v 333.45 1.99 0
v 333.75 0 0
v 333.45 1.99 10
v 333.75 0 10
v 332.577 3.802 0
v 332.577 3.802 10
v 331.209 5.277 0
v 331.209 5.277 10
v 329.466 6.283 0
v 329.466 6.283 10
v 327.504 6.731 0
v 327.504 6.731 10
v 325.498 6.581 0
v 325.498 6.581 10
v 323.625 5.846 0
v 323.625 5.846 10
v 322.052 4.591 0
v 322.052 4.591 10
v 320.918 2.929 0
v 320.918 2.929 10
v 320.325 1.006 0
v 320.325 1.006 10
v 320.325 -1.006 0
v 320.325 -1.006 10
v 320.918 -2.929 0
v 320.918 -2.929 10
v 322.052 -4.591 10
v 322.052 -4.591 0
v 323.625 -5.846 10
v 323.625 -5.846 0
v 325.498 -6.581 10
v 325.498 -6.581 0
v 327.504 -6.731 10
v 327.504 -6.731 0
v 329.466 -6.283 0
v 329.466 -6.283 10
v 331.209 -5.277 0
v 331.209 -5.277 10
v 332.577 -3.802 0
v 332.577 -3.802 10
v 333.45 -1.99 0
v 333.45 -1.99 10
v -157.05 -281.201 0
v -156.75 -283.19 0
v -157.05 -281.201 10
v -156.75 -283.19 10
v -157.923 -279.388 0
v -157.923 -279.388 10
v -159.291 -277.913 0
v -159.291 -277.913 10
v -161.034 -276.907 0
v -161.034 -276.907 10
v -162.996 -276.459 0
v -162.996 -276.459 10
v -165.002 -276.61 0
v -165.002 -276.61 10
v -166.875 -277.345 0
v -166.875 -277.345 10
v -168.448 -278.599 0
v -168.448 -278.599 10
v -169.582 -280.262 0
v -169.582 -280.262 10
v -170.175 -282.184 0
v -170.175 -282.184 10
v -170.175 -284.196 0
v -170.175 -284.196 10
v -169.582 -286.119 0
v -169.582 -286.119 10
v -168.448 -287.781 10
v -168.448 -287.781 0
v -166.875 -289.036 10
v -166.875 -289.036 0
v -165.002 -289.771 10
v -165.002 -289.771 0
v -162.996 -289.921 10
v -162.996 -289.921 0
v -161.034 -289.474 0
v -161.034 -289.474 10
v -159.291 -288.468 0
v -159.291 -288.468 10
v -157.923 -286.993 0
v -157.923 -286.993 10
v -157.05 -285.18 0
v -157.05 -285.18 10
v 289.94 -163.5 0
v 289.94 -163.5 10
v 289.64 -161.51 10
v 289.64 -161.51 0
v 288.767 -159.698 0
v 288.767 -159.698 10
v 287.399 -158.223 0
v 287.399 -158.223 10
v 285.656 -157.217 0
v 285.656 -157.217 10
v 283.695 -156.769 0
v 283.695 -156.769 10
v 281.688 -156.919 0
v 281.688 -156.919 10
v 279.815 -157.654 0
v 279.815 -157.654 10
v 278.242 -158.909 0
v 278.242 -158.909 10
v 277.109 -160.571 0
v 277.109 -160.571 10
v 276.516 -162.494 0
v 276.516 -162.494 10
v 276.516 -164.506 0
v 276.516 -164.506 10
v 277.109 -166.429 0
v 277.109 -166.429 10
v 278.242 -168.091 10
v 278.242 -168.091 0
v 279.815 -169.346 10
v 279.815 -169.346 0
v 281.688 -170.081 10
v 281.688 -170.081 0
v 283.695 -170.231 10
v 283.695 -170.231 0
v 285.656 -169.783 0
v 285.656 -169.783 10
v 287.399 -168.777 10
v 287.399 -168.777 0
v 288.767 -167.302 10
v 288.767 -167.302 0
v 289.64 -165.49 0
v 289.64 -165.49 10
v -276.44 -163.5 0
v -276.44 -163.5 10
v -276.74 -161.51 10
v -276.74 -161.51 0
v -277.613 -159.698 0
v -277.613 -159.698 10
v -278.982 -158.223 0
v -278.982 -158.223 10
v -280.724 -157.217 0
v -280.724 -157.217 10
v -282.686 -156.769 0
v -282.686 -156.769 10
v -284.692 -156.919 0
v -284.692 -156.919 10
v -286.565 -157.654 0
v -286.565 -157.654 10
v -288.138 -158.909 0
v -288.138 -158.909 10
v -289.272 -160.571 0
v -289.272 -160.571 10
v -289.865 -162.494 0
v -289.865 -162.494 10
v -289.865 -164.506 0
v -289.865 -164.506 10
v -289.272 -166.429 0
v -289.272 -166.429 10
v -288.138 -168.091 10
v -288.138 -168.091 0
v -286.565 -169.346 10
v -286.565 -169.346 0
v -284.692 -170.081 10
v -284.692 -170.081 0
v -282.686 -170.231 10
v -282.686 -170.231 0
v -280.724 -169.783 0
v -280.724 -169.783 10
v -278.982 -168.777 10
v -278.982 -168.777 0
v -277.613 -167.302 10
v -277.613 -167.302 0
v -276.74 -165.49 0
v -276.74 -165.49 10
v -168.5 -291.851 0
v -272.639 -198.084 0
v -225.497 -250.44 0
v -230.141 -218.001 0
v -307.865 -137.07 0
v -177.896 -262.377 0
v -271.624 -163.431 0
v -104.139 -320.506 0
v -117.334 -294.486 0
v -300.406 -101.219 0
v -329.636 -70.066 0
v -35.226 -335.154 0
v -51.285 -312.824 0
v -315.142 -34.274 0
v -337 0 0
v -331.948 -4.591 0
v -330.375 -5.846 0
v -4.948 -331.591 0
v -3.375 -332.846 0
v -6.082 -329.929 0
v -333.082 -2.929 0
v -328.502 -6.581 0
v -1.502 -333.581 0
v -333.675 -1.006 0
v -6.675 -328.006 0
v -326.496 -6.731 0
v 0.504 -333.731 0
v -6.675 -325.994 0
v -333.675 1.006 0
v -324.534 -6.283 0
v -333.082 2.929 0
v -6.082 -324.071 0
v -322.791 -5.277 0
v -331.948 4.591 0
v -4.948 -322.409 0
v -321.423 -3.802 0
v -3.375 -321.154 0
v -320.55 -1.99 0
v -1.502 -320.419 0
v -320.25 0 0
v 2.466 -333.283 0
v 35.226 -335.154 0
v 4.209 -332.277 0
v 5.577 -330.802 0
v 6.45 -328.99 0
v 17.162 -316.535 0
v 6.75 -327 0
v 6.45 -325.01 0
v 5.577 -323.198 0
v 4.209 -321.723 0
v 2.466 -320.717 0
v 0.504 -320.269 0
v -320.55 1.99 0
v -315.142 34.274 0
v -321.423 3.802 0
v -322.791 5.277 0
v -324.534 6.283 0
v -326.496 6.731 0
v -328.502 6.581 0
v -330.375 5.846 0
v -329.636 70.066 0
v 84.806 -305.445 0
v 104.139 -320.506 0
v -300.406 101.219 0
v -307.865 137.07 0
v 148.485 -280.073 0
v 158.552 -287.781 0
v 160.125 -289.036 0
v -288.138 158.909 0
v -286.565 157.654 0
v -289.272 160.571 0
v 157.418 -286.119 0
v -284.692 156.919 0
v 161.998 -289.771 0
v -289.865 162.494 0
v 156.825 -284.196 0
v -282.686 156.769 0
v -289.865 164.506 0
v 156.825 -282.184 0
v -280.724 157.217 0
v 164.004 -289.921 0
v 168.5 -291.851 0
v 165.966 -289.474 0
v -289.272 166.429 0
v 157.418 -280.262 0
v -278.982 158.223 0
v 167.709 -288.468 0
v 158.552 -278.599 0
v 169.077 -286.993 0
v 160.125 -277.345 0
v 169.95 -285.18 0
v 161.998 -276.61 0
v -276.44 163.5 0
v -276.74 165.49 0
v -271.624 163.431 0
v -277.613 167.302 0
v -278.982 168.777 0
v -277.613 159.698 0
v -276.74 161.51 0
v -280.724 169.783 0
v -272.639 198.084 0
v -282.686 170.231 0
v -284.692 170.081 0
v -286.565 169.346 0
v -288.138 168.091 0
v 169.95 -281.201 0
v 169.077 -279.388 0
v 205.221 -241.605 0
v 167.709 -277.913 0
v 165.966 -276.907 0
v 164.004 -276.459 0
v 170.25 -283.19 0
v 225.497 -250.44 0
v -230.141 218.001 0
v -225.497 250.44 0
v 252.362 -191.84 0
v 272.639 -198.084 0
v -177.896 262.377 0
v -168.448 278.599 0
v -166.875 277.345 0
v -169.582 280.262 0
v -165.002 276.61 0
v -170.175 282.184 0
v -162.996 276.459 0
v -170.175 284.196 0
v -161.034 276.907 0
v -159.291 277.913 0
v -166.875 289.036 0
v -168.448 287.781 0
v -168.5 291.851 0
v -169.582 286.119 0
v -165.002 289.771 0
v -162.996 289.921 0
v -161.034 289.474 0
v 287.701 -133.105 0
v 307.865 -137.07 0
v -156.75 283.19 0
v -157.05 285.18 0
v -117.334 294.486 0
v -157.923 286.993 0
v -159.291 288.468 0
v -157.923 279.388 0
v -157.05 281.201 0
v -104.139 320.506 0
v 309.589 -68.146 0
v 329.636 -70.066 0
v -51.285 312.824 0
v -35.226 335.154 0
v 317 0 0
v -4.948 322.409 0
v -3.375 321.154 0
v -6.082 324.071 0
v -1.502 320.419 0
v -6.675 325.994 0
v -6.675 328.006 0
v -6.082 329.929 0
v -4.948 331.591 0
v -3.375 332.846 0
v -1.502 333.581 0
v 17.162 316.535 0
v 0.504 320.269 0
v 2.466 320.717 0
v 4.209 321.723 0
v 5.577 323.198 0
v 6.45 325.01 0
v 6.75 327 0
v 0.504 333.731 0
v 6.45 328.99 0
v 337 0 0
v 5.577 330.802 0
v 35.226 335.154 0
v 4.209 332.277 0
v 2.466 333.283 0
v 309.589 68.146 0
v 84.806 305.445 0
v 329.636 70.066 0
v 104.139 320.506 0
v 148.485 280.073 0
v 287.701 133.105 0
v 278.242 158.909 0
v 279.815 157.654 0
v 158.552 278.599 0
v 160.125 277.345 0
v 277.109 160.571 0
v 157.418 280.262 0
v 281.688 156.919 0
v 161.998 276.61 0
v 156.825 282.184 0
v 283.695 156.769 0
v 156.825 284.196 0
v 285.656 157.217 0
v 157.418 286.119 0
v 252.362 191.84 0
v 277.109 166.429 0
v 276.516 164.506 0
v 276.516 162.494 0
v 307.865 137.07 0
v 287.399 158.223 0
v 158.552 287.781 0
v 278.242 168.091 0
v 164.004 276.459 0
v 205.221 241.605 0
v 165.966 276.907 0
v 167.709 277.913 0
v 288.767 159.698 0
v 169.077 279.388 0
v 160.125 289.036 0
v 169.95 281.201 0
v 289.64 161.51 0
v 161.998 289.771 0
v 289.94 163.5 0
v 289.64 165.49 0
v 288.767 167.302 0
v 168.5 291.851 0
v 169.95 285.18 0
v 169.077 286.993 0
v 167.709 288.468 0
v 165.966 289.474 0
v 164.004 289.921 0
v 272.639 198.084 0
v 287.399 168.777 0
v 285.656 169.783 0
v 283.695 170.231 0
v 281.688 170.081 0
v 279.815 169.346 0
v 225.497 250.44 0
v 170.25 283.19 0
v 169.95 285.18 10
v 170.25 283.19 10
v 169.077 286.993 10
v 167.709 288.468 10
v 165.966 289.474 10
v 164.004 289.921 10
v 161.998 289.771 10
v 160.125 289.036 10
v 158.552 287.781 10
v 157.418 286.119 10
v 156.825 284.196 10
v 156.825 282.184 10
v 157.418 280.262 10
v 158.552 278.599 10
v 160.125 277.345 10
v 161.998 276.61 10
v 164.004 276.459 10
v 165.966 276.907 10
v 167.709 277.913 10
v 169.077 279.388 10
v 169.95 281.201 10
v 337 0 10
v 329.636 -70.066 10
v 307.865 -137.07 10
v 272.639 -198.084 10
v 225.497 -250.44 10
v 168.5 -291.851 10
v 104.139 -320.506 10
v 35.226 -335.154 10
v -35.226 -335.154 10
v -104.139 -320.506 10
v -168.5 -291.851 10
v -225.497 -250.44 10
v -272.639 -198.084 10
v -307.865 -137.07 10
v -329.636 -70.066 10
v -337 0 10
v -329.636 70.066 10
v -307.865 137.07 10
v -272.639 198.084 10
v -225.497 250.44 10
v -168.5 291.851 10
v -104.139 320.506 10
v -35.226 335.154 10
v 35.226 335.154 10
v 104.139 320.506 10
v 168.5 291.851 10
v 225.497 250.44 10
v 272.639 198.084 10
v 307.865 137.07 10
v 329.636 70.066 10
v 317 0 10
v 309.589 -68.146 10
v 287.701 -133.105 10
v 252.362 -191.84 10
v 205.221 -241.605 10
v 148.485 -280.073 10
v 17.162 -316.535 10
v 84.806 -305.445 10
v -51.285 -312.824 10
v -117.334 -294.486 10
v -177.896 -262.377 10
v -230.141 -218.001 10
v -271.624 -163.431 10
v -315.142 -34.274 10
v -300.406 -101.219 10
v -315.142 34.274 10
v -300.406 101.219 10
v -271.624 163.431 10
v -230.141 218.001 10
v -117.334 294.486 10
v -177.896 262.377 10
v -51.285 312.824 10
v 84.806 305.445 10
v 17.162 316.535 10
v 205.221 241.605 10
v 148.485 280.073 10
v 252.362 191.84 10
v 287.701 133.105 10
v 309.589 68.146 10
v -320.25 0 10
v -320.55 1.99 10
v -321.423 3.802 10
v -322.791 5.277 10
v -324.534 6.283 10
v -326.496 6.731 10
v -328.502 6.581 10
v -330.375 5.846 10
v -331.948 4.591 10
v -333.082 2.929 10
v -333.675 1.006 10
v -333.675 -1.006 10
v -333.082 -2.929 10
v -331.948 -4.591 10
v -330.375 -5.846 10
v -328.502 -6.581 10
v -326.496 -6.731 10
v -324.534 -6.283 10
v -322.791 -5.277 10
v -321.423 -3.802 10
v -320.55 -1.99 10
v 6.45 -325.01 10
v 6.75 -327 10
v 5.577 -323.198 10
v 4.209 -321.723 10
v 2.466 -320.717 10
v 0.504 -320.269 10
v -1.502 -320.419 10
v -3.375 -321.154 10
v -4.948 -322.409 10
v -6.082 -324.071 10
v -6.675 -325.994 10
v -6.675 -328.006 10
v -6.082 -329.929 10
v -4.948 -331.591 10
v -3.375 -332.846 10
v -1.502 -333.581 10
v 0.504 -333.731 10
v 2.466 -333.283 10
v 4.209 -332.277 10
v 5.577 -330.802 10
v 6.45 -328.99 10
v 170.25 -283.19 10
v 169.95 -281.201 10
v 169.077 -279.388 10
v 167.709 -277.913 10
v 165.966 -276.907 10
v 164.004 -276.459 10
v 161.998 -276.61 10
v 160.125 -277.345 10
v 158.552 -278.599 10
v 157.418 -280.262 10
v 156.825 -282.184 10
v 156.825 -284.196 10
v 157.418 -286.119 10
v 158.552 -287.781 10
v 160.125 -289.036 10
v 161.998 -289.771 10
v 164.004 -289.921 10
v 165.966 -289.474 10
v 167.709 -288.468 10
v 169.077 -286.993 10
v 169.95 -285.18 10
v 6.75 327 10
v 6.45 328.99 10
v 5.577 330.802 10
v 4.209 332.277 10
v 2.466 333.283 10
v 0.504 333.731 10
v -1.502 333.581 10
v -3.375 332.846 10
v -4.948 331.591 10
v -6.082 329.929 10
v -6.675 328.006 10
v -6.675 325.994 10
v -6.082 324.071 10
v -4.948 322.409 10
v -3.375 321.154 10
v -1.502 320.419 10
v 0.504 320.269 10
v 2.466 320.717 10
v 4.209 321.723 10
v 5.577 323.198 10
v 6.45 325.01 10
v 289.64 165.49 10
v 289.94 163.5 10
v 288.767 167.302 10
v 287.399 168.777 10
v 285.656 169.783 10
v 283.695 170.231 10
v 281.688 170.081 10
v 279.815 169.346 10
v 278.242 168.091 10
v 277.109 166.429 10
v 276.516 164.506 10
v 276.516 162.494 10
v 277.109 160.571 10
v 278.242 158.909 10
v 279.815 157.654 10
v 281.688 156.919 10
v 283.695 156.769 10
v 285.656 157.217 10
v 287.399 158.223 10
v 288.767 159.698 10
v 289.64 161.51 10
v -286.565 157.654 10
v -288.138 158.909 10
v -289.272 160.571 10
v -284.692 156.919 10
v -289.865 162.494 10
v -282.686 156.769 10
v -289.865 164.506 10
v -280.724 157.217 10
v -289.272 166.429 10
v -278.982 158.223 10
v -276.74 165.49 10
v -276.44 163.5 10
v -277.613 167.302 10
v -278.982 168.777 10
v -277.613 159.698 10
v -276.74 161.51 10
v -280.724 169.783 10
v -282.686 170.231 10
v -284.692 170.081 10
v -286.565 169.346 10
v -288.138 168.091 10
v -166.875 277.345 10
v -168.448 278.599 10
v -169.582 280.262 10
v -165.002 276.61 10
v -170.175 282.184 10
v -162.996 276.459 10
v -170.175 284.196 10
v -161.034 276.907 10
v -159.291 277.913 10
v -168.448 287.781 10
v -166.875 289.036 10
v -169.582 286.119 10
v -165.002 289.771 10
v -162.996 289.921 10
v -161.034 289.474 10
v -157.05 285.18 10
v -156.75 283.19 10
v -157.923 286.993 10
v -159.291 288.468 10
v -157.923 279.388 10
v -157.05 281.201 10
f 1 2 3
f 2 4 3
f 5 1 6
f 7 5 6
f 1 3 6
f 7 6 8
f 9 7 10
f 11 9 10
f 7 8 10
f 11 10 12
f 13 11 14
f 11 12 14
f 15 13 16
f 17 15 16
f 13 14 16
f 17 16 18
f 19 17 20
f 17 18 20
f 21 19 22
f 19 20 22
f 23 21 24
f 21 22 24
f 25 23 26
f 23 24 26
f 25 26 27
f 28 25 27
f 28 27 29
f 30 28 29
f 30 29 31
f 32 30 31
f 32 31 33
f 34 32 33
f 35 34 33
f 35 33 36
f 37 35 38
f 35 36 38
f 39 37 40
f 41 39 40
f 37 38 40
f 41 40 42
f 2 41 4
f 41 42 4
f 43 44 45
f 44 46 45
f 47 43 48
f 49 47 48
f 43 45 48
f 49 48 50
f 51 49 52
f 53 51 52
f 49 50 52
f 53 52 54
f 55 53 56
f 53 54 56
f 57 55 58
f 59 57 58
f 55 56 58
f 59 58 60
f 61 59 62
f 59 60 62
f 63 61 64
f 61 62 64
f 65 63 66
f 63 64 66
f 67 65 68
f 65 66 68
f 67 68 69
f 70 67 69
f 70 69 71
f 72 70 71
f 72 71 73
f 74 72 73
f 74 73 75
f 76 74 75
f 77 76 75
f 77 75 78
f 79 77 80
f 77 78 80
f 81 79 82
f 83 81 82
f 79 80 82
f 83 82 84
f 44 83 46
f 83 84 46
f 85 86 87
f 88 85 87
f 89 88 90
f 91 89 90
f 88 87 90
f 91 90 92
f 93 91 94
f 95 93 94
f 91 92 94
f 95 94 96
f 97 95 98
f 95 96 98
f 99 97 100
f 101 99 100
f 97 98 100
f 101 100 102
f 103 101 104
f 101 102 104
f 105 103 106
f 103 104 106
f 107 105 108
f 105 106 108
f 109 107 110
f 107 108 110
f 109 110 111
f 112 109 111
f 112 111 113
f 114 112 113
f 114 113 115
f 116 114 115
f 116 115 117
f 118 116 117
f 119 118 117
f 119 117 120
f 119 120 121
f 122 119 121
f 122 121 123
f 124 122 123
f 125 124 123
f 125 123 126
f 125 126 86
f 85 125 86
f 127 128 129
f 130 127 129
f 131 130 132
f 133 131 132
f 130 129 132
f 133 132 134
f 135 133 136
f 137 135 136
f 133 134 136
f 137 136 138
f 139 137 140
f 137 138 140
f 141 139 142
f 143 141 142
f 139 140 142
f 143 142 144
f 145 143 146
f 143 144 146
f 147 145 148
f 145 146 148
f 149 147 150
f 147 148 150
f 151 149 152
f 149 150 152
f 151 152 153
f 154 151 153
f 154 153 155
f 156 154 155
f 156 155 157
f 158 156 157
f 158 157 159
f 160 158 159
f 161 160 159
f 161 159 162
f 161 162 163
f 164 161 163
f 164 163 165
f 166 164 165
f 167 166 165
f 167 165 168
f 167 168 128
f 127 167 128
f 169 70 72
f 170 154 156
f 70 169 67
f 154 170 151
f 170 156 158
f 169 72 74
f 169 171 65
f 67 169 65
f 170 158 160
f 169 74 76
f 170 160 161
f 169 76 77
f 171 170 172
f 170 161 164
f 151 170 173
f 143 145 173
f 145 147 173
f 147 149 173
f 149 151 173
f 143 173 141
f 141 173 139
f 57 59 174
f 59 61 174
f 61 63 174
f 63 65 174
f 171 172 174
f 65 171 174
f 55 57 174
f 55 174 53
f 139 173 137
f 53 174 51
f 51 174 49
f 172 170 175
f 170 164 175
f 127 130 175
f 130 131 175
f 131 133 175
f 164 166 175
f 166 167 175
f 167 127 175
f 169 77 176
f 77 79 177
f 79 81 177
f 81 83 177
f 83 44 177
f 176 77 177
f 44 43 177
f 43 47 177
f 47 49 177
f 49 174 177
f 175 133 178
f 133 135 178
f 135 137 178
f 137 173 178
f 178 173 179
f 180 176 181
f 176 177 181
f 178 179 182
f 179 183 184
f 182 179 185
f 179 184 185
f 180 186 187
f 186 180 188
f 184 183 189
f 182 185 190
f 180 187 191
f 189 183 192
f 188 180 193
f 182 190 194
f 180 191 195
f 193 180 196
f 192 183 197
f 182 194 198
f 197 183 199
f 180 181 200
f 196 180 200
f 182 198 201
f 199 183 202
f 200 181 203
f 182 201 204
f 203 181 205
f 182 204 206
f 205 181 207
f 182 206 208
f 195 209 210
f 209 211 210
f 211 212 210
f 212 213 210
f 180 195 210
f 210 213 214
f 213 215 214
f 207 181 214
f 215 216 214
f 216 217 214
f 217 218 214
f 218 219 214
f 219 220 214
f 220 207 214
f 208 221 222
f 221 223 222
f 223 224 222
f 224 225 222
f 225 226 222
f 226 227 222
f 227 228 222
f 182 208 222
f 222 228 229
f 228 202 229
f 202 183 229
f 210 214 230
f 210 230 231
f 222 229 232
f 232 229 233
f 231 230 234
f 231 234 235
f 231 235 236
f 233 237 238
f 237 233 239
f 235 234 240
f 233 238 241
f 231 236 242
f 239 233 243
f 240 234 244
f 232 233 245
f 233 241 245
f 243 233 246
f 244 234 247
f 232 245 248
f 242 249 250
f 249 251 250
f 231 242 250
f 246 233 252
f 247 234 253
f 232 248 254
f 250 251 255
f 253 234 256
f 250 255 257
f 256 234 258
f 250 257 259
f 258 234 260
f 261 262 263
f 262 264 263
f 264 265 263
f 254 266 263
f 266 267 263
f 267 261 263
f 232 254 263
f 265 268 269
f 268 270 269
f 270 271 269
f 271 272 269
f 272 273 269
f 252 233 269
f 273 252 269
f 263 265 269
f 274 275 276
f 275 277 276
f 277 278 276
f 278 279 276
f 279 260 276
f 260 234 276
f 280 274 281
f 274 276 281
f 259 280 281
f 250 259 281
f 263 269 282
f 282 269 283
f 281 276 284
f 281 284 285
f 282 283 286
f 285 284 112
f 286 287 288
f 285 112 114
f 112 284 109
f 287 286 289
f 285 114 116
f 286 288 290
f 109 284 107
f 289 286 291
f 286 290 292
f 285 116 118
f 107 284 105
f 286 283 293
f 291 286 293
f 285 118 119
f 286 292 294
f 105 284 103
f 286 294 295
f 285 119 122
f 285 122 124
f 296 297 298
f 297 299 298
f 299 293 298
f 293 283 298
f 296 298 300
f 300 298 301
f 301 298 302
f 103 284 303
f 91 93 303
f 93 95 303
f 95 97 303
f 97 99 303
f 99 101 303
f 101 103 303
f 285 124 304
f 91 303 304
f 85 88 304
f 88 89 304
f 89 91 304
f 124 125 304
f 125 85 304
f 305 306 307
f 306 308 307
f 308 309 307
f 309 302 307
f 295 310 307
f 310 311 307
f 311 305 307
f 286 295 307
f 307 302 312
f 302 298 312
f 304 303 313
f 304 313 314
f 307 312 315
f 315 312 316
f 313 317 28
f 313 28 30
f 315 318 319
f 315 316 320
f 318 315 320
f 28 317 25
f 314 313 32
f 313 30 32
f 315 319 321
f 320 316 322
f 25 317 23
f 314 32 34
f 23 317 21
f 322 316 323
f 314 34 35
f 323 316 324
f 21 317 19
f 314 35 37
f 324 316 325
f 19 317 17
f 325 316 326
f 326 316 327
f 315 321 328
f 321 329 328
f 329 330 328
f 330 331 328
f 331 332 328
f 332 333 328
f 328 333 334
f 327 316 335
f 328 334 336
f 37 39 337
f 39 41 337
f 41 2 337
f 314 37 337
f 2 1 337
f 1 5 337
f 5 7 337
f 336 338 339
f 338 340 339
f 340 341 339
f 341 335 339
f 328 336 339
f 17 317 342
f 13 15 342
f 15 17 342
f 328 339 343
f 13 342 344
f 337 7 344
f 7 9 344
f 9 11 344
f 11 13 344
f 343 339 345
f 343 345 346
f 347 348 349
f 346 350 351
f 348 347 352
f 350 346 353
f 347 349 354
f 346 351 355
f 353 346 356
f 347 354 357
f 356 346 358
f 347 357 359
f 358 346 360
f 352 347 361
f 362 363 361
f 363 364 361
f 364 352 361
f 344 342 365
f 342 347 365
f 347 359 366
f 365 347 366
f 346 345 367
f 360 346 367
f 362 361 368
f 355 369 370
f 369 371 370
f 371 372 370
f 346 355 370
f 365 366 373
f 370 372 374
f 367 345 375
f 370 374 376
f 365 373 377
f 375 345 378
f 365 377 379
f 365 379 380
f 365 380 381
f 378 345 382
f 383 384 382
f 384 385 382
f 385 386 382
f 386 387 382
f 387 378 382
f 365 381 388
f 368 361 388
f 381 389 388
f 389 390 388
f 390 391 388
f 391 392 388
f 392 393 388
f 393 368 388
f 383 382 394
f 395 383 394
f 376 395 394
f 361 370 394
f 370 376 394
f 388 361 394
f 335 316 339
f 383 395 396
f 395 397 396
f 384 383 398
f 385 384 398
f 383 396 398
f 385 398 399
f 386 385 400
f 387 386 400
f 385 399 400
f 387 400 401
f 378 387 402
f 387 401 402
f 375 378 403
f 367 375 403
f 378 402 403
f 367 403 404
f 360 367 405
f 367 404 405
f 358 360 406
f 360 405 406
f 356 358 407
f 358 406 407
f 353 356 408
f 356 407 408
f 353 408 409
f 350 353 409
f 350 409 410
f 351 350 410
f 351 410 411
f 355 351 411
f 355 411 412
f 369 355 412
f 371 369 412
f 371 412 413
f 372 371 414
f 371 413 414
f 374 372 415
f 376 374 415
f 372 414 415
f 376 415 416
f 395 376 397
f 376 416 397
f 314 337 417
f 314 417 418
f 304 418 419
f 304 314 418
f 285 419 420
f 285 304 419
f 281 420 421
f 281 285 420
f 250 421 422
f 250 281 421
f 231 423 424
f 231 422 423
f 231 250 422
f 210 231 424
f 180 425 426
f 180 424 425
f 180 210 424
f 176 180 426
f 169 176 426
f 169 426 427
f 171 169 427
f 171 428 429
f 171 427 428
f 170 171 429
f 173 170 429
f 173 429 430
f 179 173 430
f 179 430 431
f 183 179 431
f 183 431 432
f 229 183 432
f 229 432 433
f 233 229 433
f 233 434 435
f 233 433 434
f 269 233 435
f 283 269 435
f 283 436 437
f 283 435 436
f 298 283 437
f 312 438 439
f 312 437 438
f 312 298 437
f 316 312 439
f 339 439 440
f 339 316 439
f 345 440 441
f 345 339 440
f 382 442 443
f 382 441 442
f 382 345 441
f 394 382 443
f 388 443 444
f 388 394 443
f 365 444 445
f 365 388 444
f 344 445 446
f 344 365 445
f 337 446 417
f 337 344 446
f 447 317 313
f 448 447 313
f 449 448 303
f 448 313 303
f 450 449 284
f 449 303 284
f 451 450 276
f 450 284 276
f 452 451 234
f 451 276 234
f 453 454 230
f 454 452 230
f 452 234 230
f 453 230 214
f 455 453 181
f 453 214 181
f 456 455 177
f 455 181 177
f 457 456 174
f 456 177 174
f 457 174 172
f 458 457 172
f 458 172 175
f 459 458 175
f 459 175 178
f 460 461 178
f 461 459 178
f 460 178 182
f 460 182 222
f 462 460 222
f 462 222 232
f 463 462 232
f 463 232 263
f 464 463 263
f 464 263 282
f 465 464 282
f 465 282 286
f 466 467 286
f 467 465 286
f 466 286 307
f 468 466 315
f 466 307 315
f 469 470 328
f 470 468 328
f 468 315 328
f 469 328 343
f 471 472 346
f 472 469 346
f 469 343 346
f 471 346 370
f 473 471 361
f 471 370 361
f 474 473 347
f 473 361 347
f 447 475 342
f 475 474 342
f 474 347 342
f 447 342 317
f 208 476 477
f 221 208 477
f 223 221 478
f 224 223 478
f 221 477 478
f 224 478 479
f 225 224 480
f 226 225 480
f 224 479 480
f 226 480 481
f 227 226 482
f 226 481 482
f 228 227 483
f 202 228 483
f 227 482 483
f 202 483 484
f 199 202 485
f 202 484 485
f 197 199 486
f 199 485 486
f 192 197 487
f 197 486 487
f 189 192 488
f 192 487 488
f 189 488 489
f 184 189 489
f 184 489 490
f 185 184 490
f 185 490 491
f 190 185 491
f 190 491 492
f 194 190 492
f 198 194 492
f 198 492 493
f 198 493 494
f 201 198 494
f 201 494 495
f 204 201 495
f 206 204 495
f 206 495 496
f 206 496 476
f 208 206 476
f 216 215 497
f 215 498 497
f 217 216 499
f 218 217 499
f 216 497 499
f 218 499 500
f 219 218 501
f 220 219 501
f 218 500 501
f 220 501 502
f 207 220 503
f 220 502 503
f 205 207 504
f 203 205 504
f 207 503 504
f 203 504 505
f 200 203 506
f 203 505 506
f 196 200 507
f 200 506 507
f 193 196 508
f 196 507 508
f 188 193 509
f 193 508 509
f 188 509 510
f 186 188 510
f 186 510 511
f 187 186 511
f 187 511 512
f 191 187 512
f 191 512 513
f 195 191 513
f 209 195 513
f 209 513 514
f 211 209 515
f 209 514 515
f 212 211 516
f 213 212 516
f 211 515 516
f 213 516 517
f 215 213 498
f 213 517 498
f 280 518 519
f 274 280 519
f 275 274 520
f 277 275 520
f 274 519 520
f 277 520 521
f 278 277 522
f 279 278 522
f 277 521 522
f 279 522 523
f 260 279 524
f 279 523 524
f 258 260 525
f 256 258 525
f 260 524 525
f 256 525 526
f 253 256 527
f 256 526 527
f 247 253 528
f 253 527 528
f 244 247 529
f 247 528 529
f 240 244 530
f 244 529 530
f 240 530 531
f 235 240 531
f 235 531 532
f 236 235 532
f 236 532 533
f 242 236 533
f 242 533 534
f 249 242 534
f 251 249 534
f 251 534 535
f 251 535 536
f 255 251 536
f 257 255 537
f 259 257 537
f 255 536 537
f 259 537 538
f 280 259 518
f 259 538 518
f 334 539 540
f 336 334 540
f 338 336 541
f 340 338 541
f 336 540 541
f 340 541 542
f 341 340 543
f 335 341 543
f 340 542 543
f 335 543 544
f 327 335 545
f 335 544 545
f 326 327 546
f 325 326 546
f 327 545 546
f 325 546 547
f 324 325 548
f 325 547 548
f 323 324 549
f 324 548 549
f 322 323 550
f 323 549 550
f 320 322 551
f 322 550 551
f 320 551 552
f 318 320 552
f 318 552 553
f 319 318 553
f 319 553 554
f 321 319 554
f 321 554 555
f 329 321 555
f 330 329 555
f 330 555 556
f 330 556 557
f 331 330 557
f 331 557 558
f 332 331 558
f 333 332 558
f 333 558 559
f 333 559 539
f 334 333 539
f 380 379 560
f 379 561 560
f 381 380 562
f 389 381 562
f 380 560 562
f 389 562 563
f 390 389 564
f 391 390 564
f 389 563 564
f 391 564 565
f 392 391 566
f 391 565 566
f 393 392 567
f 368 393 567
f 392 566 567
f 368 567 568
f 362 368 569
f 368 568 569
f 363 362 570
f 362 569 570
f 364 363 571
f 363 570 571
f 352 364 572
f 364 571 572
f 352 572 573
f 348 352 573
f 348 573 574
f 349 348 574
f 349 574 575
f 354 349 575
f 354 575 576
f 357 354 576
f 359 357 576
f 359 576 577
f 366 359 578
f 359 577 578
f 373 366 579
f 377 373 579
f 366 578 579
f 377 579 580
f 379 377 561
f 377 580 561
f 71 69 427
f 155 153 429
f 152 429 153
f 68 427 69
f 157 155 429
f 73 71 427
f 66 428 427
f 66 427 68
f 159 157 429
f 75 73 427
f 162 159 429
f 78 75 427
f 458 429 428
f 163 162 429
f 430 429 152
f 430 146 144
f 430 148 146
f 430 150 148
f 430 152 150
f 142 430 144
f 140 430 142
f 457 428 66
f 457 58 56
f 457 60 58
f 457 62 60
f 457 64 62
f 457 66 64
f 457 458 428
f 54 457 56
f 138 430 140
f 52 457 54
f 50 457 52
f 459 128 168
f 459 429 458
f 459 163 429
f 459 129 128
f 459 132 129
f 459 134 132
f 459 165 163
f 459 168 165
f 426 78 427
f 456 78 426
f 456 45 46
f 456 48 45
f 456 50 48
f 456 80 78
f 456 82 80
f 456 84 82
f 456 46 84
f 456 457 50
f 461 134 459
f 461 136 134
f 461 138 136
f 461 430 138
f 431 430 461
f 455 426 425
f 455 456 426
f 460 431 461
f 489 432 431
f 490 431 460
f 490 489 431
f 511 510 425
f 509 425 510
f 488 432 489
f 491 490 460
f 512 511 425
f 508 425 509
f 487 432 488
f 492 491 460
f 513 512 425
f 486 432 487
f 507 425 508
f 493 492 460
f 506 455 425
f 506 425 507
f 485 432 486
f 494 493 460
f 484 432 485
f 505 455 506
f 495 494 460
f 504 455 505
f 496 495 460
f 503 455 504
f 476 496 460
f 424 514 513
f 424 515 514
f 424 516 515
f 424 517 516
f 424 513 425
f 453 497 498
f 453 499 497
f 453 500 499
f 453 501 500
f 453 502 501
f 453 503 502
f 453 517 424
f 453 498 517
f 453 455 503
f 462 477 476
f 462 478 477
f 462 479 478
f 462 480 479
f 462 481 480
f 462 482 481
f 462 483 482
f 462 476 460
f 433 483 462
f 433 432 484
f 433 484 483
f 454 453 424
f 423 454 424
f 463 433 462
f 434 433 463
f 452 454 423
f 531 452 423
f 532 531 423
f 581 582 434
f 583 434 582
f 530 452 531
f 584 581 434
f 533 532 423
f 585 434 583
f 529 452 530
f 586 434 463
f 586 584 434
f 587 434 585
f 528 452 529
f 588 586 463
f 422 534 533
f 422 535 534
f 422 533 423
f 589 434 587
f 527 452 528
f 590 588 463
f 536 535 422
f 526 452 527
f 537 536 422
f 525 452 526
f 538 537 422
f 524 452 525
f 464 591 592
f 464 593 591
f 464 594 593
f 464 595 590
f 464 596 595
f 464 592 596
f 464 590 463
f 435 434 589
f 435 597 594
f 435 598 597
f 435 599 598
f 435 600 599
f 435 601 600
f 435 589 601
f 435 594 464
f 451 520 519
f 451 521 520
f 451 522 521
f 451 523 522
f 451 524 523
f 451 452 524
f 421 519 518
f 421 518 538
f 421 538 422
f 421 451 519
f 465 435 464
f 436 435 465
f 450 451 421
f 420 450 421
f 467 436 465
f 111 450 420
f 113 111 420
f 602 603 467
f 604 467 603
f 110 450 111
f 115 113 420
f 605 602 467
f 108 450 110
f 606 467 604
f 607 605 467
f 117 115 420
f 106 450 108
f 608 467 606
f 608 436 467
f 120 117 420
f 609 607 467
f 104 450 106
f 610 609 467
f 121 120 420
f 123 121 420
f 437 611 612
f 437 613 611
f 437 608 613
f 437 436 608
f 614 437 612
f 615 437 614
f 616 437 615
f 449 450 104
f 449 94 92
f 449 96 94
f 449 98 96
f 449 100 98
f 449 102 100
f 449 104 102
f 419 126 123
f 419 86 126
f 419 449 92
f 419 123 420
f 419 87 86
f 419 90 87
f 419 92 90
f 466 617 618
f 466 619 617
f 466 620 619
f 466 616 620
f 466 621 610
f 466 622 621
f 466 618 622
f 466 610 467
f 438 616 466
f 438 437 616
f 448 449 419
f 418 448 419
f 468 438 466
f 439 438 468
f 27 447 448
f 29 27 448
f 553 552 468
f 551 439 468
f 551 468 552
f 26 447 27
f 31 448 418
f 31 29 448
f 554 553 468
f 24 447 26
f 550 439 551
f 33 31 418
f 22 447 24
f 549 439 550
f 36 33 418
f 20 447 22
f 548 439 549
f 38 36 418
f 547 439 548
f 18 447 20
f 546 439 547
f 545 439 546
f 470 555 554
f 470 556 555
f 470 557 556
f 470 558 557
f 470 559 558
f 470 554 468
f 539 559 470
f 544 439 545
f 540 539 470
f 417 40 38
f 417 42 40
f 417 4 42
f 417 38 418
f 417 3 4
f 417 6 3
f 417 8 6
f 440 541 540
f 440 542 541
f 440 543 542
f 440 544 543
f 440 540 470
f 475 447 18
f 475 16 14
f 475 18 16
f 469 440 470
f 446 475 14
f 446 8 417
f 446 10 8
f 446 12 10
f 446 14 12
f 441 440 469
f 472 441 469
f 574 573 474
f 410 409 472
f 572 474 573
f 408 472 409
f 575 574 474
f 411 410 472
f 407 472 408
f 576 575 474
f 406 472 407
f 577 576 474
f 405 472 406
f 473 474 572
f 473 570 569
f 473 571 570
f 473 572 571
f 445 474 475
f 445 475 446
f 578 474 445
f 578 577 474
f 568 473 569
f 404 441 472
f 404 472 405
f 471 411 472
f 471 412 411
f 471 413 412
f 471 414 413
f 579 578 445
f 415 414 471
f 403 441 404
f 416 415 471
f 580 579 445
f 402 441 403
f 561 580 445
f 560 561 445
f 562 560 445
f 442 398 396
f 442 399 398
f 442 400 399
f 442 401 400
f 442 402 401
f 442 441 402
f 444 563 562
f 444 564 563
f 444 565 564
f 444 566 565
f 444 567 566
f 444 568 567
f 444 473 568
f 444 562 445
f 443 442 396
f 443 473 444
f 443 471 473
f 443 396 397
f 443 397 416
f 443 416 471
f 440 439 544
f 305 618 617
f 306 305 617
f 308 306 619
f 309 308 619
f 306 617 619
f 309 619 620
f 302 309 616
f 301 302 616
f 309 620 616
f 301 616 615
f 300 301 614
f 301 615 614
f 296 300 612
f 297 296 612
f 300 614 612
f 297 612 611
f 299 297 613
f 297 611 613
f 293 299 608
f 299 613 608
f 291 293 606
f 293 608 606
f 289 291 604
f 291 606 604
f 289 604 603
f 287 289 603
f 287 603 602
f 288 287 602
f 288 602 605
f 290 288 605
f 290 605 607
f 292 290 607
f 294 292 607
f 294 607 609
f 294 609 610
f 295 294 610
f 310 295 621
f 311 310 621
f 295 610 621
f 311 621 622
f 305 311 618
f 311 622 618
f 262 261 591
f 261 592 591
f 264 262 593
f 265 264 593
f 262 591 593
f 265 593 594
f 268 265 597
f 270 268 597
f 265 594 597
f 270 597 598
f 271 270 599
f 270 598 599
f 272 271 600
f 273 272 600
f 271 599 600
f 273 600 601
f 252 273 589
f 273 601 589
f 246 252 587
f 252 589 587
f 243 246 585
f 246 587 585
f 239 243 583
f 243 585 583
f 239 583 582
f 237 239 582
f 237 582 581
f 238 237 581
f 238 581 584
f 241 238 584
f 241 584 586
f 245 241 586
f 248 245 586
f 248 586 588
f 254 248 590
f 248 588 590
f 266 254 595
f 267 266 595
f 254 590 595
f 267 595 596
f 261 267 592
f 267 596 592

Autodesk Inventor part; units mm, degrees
ref_plane "YZ Plane" through (0, 0, 0) normal (1, 0, 0) x (0, 1, 0)
ref_plane "XZ Plane" through (0, 0, 0) normal (0, 1, 0) x (-1, 0, 0)
ref_plane "XY Plane" through (0, 0, 0) normal (0, 0, 1) x (1, 0, 0)
sketch "Boceto1" plane through (0, 0, 0) normal (0, 0, 1) x (1, 0, 0)
  circle A0 centre (0, 0) radius 337
  circle A1 centre (0, 0) radius 317
  dimension "d0" = 674
  dimension "d1" = 634
extrude "Extrusión1" add sketch "Boceto1" along normal blind 10
sketch "Boceto2" plane through (0, 0, 10) normal (0, 0, 1) x (1, 0, 0)
  circle A0 centre (0, 0) radius 327 construction
  circle A1 centre (0, 0) radius 337 projected
  circle A2 centre (0, 327) radius 6.75
  circle A3 centre (-163.5, 283.1903) radius 6.75
  circle A4 centre (-283.1903, 163.5) radius 6.75
  circle A5 centre (-327, 0) radius 6.75
  circle A6 centre (-283.1903, -163.5) radius 6.75
  circle A7 centre (-163.5, -283.1903) radius 6.75
  circle A8 centre (0, -327) radius 6.75
  circle A9 centre (163.5, -283.1903) radius 6.75
  circle A10 centre (283.1903, -163.5) radius 6.75
  circle A11 centre (327, 0) radius 6.75
  circle A12 centre (283.1903, 163.5) radius 6.75
  circle A13 centre (163.5, 283.1903) radius 6.75
  dimension "d4" = 10
  dimension "d5" = 13.5
  dimension "d8" = 360
extrude "Extrusión2" cut sketch "Boceto2" against normal through all contours A2 | A3 | A4 | A5 | A6 | A7 | A8 | A9 | A10 | A11 | A12 | A13
properties part number "Aro del tambor"
